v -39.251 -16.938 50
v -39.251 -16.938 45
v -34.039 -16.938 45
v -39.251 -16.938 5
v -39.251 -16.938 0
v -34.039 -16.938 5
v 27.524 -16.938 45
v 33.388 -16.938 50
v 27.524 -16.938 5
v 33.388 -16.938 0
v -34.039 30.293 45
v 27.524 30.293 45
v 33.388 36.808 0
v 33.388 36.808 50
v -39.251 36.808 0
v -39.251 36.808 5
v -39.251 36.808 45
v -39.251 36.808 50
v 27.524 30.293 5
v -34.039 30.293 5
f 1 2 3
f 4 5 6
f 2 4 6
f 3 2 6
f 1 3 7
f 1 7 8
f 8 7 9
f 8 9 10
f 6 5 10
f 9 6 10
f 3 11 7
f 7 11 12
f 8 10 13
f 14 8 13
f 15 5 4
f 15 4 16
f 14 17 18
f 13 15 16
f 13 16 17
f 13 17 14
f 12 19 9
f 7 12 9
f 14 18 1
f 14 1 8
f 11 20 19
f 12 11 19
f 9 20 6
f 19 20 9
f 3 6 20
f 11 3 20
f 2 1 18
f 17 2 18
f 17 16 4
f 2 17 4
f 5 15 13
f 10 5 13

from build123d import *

# Parameters (mm, degrees)
F1_DEPTH = 50
F3_W     = 72.638307
F3_H     = 53.745832
F4_DEPTH = 5
F5_W     = 72.638307
F5_H     = 53.745832
F6_DEPTH = 5


with BuildPart() as f1:
    # F0 (on Top) → F1 (new body)
    with BuildSketch(Plane.XY):
        Polygon((-39.250743, -16.938083), (-34.039024, -16.938083), (-34.039024, 30.293103), (27.524386, 30.293103), (27.524386, -16.938083), (33.387564, -16.938083), (33.387564, 36.807749), (-39.250743, 36.807749), align=None)
    extrude(amount=F1_DEPTH)

    # F3 (on offset) → F4 (join)
    with BuildSketch(Plane.XY.offset(50)):
        with Locations((-2.93159, 9.934833)):
            Rectangle(F3_W, F3_H)
    extrude(amount=-F4_DEPTH)

    # F5 (on Top) → F6 (join)
    with BuildSketch(Plane.XY):
        with Locations((-2.93159, 9.934833)):
            Rectangle(F5_W, F5_H)
    extrude(amount=F6_DEPTH)


solid = f1.part
